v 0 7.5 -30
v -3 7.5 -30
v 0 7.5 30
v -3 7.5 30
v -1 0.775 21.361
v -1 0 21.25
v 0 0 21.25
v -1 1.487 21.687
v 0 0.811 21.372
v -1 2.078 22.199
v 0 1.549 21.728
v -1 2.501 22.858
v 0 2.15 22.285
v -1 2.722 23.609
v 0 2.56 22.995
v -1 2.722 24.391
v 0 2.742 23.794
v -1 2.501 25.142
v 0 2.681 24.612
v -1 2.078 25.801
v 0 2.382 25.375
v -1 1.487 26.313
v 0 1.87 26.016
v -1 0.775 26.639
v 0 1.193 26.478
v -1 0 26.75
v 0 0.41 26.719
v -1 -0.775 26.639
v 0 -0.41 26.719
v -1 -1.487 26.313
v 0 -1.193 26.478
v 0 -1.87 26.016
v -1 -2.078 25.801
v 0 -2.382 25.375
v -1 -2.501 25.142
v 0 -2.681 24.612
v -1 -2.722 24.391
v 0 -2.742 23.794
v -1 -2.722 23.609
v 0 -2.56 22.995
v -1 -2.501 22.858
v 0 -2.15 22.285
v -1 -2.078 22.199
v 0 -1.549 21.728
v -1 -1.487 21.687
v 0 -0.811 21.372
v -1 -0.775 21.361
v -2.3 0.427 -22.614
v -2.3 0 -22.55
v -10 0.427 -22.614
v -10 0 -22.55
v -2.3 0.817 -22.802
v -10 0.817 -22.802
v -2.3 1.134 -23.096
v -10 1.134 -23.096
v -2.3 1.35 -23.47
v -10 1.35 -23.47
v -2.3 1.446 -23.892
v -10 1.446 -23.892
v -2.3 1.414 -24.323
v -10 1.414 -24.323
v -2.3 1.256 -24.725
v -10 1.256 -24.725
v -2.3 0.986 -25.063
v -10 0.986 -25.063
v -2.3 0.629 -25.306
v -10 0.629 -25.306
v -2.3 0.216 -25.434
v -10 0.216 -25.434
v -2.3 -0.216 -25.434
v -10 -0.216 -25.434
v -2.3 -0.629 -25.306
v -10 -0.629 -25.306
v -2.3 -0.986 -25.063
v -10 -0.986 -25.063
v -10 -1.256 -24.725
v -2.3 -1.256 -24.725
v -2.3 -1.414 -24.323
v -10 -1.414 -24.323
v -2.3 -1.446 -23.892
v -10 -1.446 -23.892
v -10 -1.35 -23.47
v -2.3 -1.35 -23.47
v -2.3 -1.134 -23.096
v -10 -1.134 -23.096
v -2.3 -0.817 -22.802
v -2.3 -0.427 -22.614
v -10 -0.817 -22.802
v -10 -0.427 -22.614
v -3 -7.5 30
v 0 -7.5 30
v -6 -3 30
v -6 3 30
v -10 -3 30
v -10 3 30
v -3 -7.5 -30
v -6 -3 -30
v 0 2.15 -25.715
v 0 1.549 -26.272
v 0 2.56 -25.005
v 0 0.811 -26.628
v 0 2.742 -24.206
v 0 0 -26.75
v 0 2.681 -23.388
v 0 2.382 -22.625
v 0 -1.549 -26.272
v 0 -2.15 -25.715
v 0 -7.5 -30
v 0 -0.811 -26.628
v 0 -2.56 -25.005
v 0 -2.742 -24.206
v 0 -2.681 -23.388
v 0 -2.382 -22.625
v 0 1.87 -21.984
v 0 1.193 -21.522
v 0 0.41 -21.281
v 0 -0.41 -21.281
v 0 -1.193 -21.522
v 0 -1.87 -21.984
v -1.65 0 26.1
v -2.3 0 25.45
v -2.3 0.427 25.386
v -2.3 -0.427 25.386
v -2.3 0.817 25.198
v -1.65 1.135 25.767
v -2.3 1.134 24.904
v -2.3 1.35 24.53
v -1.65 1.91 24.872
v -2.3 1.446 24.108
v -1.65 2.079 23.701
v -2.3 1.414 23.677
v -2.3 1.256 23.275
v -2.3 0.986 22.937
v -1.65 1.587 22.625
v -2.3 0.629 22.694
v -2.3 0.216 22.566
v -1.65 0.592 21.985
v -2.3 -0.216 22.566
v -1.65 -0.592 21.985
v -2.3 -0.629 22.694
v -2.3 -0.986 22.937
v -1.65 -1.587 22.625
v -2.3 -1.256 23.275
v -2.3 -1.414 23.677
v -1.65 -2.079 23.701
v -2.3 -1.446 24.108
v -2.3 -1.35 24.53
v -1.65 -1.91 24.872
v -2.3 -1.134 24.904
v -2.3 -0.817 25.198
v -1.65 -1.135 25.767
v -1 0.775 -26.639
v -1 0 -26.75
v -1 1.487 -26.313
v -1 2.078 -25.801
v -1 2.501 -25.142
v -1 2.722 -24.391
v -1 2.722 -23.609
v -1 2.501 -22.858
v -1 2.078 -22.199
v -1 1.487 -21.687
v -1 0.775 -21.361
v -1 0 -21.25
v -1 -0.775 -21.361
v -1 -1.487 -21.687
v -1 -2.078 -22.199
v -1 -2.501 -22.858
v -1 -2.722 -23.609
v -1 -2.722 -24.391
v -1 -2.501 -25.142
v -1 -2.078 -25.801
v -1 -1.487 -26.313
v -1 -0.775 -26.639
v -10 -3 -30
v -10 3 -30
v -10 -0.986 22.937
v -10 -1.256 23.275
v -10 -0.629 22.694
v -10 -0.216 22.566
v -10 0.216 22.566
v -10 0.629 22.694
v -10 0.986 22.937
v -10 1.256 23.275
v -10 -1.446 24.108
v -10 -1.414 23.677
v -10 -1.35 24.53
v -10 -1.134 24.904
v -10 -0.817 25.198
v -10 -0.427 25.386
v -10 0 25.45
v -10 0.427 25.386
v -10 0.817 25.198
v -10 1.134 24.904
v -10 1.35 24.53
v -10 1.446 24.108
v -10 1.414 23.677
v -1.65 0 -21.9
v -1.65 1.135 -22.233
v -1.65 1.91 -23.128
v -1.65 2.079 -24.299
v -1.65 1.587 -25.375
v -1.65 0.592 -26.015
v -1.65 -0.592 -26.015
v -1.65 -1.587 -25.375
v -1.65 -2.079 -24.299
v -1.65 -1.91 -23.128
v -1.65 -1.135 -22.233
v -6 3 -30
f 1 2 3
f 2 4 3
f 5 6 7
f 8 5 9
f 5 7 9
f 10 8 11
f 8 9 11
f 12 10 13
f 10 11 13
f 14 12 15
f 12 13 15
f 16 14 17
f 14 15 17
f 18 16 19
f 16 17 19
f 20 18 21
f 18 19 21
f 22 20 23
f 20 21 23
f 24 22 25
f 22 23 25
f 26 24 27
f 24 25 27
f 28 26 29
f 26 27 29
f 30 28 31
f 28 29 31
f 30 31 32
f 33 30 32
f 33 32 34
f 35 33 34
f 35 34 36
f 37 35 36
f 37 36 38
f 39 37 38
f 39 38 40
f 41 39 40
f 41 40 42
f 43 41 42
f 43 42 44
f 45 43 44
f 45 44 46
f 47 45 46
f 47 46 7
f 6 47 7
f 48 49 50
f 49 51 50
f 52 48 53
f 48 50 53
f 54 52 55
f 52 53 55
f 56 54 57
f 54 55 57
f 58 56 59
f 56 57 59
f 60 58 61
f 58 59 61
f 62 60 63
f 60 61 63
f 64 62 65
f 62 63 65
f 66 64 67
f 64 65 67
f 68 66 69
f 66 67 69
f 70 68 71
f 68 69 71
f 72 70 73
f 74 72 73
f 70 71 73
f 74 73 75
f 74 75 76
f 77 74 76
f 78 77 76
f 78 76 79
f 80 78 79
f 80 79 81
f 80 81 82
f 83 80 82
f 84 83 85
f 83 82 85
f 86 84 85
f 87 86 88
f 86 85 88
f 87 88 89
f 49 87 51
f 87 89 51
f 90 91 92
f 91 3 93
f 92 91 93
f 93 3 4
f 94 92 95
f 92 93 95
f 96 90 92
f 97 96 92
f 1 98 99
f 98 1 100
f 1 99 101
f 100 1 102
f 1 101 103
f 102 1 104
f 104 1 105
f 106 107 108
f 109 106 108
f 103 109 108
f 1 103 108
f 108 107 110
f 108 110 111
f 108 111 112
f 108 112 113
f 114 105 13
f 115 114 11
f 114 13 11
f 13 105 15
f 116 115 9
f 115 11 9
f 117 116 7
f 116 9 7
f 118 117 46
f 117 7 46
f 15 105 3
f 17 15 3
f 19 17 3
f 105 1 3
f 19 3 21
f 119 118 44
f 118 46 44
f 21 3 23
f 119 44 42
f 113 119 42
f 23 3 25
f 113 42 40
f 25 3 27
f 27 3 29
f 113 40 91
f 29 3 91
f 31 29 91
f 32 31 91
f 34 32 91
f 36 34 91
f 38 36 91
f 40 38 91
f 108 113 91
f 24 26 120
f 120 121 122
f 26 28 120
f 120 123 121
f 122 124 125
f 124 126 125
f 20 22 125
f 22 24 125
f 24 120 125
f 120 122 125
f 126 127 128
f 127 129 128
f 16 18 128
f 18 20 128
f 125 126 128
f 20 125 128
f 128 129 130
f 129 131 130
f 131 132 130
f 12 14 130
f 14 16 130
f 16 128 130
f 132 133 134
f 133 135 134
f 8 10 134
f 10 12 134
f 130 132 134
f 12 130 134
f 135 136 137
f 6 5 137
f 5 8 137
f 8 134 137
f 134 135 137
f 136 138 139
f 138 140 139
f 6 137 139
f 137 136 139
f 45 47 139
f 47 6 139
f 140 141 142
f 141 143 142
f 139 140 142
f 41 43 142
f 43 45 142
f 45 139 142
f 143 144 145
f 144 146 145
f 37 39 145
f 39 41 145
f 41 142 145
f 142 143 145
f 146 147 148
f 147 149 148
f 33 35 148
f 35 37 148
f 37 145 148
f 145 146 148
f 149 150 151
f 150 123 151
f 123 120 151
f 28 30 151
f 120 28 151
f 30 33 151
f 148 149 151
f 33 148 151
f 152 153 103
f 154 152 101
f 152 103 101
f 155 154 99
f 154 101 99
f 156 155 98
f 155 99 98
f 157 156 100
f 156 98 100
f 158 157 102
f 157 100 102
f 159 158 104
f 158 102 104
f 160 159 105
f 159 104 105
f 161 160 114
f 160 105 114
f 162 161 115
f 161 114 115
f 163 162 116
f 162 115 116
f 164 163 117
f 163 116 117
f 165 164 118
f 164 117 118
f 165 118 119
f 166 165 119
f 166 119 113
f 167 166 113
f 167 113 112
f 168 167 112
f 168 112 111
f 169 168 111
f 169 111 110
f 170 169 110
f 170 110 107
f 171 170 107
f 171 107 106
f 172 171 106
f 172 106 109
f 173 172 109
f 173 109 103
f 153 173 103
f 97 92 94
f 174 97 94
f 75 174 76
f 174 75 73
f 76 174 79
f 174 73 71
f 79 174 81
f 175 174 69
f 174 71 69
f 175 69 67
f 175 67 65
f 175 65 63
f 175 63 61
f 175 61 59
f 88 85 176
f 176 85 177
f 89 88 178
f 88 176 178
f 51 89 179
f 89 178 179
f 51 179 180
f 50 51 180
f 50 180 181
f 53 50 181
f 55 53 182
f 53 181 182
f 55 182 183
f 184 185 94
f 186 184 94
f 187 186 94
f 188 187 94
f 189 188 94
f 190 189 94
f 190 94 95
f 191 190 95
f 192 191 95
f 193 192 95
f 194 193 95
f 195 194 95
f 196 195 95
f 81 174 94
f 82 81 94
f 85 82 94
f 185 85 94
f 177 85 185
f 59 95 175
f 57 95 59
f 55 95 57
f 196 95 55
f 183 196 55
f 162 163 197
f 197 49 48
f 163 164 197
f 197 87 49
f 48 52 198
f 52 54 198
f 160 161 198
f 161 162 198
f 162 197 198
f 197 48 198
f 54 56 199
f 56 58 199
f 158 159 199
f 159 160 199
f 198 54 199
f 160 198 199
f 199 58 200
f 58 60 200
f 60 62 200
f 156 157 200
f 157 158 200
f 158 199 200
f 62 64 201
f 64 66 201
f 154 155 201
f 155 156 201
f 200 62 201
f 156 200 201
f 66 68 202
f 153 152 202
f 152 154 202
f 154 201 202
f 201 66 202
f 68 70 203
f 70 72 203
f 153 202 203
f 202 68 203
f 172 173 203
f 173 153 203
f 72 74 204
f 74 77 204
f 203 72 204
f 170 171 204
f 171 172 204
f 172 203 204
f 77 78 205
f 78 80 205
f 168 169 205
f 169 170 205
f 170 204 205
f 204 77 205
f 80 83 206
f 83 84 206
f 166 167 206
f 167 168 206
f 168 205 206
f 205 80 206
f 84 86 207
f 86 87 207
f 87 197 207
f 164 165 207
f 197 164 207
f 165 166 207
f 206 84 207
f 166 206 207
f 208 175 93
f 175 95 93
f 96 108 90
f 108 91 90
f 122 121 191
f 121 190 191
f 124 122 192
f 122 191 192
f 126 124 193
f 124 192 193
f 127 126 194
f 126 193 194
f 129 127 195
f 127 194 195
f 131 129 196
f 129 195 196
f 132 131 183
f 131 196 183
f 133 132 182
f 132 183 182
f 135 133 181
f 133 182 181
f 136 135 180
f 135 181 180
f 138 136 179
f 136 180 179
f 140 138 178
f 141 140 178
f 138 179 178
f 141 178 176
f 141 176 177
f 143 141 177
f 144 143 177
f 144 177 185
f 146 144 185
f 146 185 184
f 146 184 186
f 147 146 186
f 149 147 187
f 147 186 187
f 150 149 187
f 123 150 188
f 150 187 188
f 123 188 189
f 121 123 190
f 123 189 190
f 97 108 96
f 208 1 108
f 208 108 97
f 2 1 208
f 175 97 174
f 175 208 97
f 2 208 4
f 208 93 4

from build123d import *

# Parameters (mm, degrees)
EXTRUDE_1_DEPTH               = 30
SKETCH_5_R                    = 2.75
CUT_EXTRUDE_1_DEPTH           = 1
HOLE_WIZARD_M2_52_D           = 2.9
HOLE_WIZARD_M2_52_CSINK_D     = 5.5
HOLE_WIZARD_M2_52_CSINK_ANGLE = 90


with BuildPart() as part:
    # Эскиз1 → Бобышка-Вытянуть1 (new, symmetric)
    with BuildSketch(Plane.XY):
        Polygon((-10, -3), (-10, 3), (-6, 3), (-3, 7.5), (0, 7.5), (0, -7.5), (-3, -7.5), (-6, -3), align=None)
    extrude(amount=EXTRUDE_1_DEPTH, both=True)

    # Эскиз5 → Вырез-Вытянуть1 (cut)
    with BuildSketch(Plane(origin=(0, 0, 0), x_dir=(0, 0, -1), z_dir=(1, 0, 0))):
        with Locations((-24, 0)):
            Circle(SKETCH_5_R)
        with Locations((24, 0)):
            Circle(SKETCH_5_R)
    extrude(amount=-CUT_EXTRUDE_1_DEPTH, mode=Mode.SUBTRACT)

    # Зенковка для винта с потайной головкой M2.52 (through all)
    with Locations(Plane(origin=(-1, 0, 0), x_dir=(0, 0, -1), z_dir=(1, 0, 0))):
        with Locations((-24, 0), (24, 0)):
            CounterSinkHole(HOLE_WIZARD_M2_52_D / 2, HOLE_WIZARD_M2_52_CSINK_D / 2, counter_sink_angle=HOLE_WIZARD_M2_52_CSINK_ANGLE)


solid = part.part
